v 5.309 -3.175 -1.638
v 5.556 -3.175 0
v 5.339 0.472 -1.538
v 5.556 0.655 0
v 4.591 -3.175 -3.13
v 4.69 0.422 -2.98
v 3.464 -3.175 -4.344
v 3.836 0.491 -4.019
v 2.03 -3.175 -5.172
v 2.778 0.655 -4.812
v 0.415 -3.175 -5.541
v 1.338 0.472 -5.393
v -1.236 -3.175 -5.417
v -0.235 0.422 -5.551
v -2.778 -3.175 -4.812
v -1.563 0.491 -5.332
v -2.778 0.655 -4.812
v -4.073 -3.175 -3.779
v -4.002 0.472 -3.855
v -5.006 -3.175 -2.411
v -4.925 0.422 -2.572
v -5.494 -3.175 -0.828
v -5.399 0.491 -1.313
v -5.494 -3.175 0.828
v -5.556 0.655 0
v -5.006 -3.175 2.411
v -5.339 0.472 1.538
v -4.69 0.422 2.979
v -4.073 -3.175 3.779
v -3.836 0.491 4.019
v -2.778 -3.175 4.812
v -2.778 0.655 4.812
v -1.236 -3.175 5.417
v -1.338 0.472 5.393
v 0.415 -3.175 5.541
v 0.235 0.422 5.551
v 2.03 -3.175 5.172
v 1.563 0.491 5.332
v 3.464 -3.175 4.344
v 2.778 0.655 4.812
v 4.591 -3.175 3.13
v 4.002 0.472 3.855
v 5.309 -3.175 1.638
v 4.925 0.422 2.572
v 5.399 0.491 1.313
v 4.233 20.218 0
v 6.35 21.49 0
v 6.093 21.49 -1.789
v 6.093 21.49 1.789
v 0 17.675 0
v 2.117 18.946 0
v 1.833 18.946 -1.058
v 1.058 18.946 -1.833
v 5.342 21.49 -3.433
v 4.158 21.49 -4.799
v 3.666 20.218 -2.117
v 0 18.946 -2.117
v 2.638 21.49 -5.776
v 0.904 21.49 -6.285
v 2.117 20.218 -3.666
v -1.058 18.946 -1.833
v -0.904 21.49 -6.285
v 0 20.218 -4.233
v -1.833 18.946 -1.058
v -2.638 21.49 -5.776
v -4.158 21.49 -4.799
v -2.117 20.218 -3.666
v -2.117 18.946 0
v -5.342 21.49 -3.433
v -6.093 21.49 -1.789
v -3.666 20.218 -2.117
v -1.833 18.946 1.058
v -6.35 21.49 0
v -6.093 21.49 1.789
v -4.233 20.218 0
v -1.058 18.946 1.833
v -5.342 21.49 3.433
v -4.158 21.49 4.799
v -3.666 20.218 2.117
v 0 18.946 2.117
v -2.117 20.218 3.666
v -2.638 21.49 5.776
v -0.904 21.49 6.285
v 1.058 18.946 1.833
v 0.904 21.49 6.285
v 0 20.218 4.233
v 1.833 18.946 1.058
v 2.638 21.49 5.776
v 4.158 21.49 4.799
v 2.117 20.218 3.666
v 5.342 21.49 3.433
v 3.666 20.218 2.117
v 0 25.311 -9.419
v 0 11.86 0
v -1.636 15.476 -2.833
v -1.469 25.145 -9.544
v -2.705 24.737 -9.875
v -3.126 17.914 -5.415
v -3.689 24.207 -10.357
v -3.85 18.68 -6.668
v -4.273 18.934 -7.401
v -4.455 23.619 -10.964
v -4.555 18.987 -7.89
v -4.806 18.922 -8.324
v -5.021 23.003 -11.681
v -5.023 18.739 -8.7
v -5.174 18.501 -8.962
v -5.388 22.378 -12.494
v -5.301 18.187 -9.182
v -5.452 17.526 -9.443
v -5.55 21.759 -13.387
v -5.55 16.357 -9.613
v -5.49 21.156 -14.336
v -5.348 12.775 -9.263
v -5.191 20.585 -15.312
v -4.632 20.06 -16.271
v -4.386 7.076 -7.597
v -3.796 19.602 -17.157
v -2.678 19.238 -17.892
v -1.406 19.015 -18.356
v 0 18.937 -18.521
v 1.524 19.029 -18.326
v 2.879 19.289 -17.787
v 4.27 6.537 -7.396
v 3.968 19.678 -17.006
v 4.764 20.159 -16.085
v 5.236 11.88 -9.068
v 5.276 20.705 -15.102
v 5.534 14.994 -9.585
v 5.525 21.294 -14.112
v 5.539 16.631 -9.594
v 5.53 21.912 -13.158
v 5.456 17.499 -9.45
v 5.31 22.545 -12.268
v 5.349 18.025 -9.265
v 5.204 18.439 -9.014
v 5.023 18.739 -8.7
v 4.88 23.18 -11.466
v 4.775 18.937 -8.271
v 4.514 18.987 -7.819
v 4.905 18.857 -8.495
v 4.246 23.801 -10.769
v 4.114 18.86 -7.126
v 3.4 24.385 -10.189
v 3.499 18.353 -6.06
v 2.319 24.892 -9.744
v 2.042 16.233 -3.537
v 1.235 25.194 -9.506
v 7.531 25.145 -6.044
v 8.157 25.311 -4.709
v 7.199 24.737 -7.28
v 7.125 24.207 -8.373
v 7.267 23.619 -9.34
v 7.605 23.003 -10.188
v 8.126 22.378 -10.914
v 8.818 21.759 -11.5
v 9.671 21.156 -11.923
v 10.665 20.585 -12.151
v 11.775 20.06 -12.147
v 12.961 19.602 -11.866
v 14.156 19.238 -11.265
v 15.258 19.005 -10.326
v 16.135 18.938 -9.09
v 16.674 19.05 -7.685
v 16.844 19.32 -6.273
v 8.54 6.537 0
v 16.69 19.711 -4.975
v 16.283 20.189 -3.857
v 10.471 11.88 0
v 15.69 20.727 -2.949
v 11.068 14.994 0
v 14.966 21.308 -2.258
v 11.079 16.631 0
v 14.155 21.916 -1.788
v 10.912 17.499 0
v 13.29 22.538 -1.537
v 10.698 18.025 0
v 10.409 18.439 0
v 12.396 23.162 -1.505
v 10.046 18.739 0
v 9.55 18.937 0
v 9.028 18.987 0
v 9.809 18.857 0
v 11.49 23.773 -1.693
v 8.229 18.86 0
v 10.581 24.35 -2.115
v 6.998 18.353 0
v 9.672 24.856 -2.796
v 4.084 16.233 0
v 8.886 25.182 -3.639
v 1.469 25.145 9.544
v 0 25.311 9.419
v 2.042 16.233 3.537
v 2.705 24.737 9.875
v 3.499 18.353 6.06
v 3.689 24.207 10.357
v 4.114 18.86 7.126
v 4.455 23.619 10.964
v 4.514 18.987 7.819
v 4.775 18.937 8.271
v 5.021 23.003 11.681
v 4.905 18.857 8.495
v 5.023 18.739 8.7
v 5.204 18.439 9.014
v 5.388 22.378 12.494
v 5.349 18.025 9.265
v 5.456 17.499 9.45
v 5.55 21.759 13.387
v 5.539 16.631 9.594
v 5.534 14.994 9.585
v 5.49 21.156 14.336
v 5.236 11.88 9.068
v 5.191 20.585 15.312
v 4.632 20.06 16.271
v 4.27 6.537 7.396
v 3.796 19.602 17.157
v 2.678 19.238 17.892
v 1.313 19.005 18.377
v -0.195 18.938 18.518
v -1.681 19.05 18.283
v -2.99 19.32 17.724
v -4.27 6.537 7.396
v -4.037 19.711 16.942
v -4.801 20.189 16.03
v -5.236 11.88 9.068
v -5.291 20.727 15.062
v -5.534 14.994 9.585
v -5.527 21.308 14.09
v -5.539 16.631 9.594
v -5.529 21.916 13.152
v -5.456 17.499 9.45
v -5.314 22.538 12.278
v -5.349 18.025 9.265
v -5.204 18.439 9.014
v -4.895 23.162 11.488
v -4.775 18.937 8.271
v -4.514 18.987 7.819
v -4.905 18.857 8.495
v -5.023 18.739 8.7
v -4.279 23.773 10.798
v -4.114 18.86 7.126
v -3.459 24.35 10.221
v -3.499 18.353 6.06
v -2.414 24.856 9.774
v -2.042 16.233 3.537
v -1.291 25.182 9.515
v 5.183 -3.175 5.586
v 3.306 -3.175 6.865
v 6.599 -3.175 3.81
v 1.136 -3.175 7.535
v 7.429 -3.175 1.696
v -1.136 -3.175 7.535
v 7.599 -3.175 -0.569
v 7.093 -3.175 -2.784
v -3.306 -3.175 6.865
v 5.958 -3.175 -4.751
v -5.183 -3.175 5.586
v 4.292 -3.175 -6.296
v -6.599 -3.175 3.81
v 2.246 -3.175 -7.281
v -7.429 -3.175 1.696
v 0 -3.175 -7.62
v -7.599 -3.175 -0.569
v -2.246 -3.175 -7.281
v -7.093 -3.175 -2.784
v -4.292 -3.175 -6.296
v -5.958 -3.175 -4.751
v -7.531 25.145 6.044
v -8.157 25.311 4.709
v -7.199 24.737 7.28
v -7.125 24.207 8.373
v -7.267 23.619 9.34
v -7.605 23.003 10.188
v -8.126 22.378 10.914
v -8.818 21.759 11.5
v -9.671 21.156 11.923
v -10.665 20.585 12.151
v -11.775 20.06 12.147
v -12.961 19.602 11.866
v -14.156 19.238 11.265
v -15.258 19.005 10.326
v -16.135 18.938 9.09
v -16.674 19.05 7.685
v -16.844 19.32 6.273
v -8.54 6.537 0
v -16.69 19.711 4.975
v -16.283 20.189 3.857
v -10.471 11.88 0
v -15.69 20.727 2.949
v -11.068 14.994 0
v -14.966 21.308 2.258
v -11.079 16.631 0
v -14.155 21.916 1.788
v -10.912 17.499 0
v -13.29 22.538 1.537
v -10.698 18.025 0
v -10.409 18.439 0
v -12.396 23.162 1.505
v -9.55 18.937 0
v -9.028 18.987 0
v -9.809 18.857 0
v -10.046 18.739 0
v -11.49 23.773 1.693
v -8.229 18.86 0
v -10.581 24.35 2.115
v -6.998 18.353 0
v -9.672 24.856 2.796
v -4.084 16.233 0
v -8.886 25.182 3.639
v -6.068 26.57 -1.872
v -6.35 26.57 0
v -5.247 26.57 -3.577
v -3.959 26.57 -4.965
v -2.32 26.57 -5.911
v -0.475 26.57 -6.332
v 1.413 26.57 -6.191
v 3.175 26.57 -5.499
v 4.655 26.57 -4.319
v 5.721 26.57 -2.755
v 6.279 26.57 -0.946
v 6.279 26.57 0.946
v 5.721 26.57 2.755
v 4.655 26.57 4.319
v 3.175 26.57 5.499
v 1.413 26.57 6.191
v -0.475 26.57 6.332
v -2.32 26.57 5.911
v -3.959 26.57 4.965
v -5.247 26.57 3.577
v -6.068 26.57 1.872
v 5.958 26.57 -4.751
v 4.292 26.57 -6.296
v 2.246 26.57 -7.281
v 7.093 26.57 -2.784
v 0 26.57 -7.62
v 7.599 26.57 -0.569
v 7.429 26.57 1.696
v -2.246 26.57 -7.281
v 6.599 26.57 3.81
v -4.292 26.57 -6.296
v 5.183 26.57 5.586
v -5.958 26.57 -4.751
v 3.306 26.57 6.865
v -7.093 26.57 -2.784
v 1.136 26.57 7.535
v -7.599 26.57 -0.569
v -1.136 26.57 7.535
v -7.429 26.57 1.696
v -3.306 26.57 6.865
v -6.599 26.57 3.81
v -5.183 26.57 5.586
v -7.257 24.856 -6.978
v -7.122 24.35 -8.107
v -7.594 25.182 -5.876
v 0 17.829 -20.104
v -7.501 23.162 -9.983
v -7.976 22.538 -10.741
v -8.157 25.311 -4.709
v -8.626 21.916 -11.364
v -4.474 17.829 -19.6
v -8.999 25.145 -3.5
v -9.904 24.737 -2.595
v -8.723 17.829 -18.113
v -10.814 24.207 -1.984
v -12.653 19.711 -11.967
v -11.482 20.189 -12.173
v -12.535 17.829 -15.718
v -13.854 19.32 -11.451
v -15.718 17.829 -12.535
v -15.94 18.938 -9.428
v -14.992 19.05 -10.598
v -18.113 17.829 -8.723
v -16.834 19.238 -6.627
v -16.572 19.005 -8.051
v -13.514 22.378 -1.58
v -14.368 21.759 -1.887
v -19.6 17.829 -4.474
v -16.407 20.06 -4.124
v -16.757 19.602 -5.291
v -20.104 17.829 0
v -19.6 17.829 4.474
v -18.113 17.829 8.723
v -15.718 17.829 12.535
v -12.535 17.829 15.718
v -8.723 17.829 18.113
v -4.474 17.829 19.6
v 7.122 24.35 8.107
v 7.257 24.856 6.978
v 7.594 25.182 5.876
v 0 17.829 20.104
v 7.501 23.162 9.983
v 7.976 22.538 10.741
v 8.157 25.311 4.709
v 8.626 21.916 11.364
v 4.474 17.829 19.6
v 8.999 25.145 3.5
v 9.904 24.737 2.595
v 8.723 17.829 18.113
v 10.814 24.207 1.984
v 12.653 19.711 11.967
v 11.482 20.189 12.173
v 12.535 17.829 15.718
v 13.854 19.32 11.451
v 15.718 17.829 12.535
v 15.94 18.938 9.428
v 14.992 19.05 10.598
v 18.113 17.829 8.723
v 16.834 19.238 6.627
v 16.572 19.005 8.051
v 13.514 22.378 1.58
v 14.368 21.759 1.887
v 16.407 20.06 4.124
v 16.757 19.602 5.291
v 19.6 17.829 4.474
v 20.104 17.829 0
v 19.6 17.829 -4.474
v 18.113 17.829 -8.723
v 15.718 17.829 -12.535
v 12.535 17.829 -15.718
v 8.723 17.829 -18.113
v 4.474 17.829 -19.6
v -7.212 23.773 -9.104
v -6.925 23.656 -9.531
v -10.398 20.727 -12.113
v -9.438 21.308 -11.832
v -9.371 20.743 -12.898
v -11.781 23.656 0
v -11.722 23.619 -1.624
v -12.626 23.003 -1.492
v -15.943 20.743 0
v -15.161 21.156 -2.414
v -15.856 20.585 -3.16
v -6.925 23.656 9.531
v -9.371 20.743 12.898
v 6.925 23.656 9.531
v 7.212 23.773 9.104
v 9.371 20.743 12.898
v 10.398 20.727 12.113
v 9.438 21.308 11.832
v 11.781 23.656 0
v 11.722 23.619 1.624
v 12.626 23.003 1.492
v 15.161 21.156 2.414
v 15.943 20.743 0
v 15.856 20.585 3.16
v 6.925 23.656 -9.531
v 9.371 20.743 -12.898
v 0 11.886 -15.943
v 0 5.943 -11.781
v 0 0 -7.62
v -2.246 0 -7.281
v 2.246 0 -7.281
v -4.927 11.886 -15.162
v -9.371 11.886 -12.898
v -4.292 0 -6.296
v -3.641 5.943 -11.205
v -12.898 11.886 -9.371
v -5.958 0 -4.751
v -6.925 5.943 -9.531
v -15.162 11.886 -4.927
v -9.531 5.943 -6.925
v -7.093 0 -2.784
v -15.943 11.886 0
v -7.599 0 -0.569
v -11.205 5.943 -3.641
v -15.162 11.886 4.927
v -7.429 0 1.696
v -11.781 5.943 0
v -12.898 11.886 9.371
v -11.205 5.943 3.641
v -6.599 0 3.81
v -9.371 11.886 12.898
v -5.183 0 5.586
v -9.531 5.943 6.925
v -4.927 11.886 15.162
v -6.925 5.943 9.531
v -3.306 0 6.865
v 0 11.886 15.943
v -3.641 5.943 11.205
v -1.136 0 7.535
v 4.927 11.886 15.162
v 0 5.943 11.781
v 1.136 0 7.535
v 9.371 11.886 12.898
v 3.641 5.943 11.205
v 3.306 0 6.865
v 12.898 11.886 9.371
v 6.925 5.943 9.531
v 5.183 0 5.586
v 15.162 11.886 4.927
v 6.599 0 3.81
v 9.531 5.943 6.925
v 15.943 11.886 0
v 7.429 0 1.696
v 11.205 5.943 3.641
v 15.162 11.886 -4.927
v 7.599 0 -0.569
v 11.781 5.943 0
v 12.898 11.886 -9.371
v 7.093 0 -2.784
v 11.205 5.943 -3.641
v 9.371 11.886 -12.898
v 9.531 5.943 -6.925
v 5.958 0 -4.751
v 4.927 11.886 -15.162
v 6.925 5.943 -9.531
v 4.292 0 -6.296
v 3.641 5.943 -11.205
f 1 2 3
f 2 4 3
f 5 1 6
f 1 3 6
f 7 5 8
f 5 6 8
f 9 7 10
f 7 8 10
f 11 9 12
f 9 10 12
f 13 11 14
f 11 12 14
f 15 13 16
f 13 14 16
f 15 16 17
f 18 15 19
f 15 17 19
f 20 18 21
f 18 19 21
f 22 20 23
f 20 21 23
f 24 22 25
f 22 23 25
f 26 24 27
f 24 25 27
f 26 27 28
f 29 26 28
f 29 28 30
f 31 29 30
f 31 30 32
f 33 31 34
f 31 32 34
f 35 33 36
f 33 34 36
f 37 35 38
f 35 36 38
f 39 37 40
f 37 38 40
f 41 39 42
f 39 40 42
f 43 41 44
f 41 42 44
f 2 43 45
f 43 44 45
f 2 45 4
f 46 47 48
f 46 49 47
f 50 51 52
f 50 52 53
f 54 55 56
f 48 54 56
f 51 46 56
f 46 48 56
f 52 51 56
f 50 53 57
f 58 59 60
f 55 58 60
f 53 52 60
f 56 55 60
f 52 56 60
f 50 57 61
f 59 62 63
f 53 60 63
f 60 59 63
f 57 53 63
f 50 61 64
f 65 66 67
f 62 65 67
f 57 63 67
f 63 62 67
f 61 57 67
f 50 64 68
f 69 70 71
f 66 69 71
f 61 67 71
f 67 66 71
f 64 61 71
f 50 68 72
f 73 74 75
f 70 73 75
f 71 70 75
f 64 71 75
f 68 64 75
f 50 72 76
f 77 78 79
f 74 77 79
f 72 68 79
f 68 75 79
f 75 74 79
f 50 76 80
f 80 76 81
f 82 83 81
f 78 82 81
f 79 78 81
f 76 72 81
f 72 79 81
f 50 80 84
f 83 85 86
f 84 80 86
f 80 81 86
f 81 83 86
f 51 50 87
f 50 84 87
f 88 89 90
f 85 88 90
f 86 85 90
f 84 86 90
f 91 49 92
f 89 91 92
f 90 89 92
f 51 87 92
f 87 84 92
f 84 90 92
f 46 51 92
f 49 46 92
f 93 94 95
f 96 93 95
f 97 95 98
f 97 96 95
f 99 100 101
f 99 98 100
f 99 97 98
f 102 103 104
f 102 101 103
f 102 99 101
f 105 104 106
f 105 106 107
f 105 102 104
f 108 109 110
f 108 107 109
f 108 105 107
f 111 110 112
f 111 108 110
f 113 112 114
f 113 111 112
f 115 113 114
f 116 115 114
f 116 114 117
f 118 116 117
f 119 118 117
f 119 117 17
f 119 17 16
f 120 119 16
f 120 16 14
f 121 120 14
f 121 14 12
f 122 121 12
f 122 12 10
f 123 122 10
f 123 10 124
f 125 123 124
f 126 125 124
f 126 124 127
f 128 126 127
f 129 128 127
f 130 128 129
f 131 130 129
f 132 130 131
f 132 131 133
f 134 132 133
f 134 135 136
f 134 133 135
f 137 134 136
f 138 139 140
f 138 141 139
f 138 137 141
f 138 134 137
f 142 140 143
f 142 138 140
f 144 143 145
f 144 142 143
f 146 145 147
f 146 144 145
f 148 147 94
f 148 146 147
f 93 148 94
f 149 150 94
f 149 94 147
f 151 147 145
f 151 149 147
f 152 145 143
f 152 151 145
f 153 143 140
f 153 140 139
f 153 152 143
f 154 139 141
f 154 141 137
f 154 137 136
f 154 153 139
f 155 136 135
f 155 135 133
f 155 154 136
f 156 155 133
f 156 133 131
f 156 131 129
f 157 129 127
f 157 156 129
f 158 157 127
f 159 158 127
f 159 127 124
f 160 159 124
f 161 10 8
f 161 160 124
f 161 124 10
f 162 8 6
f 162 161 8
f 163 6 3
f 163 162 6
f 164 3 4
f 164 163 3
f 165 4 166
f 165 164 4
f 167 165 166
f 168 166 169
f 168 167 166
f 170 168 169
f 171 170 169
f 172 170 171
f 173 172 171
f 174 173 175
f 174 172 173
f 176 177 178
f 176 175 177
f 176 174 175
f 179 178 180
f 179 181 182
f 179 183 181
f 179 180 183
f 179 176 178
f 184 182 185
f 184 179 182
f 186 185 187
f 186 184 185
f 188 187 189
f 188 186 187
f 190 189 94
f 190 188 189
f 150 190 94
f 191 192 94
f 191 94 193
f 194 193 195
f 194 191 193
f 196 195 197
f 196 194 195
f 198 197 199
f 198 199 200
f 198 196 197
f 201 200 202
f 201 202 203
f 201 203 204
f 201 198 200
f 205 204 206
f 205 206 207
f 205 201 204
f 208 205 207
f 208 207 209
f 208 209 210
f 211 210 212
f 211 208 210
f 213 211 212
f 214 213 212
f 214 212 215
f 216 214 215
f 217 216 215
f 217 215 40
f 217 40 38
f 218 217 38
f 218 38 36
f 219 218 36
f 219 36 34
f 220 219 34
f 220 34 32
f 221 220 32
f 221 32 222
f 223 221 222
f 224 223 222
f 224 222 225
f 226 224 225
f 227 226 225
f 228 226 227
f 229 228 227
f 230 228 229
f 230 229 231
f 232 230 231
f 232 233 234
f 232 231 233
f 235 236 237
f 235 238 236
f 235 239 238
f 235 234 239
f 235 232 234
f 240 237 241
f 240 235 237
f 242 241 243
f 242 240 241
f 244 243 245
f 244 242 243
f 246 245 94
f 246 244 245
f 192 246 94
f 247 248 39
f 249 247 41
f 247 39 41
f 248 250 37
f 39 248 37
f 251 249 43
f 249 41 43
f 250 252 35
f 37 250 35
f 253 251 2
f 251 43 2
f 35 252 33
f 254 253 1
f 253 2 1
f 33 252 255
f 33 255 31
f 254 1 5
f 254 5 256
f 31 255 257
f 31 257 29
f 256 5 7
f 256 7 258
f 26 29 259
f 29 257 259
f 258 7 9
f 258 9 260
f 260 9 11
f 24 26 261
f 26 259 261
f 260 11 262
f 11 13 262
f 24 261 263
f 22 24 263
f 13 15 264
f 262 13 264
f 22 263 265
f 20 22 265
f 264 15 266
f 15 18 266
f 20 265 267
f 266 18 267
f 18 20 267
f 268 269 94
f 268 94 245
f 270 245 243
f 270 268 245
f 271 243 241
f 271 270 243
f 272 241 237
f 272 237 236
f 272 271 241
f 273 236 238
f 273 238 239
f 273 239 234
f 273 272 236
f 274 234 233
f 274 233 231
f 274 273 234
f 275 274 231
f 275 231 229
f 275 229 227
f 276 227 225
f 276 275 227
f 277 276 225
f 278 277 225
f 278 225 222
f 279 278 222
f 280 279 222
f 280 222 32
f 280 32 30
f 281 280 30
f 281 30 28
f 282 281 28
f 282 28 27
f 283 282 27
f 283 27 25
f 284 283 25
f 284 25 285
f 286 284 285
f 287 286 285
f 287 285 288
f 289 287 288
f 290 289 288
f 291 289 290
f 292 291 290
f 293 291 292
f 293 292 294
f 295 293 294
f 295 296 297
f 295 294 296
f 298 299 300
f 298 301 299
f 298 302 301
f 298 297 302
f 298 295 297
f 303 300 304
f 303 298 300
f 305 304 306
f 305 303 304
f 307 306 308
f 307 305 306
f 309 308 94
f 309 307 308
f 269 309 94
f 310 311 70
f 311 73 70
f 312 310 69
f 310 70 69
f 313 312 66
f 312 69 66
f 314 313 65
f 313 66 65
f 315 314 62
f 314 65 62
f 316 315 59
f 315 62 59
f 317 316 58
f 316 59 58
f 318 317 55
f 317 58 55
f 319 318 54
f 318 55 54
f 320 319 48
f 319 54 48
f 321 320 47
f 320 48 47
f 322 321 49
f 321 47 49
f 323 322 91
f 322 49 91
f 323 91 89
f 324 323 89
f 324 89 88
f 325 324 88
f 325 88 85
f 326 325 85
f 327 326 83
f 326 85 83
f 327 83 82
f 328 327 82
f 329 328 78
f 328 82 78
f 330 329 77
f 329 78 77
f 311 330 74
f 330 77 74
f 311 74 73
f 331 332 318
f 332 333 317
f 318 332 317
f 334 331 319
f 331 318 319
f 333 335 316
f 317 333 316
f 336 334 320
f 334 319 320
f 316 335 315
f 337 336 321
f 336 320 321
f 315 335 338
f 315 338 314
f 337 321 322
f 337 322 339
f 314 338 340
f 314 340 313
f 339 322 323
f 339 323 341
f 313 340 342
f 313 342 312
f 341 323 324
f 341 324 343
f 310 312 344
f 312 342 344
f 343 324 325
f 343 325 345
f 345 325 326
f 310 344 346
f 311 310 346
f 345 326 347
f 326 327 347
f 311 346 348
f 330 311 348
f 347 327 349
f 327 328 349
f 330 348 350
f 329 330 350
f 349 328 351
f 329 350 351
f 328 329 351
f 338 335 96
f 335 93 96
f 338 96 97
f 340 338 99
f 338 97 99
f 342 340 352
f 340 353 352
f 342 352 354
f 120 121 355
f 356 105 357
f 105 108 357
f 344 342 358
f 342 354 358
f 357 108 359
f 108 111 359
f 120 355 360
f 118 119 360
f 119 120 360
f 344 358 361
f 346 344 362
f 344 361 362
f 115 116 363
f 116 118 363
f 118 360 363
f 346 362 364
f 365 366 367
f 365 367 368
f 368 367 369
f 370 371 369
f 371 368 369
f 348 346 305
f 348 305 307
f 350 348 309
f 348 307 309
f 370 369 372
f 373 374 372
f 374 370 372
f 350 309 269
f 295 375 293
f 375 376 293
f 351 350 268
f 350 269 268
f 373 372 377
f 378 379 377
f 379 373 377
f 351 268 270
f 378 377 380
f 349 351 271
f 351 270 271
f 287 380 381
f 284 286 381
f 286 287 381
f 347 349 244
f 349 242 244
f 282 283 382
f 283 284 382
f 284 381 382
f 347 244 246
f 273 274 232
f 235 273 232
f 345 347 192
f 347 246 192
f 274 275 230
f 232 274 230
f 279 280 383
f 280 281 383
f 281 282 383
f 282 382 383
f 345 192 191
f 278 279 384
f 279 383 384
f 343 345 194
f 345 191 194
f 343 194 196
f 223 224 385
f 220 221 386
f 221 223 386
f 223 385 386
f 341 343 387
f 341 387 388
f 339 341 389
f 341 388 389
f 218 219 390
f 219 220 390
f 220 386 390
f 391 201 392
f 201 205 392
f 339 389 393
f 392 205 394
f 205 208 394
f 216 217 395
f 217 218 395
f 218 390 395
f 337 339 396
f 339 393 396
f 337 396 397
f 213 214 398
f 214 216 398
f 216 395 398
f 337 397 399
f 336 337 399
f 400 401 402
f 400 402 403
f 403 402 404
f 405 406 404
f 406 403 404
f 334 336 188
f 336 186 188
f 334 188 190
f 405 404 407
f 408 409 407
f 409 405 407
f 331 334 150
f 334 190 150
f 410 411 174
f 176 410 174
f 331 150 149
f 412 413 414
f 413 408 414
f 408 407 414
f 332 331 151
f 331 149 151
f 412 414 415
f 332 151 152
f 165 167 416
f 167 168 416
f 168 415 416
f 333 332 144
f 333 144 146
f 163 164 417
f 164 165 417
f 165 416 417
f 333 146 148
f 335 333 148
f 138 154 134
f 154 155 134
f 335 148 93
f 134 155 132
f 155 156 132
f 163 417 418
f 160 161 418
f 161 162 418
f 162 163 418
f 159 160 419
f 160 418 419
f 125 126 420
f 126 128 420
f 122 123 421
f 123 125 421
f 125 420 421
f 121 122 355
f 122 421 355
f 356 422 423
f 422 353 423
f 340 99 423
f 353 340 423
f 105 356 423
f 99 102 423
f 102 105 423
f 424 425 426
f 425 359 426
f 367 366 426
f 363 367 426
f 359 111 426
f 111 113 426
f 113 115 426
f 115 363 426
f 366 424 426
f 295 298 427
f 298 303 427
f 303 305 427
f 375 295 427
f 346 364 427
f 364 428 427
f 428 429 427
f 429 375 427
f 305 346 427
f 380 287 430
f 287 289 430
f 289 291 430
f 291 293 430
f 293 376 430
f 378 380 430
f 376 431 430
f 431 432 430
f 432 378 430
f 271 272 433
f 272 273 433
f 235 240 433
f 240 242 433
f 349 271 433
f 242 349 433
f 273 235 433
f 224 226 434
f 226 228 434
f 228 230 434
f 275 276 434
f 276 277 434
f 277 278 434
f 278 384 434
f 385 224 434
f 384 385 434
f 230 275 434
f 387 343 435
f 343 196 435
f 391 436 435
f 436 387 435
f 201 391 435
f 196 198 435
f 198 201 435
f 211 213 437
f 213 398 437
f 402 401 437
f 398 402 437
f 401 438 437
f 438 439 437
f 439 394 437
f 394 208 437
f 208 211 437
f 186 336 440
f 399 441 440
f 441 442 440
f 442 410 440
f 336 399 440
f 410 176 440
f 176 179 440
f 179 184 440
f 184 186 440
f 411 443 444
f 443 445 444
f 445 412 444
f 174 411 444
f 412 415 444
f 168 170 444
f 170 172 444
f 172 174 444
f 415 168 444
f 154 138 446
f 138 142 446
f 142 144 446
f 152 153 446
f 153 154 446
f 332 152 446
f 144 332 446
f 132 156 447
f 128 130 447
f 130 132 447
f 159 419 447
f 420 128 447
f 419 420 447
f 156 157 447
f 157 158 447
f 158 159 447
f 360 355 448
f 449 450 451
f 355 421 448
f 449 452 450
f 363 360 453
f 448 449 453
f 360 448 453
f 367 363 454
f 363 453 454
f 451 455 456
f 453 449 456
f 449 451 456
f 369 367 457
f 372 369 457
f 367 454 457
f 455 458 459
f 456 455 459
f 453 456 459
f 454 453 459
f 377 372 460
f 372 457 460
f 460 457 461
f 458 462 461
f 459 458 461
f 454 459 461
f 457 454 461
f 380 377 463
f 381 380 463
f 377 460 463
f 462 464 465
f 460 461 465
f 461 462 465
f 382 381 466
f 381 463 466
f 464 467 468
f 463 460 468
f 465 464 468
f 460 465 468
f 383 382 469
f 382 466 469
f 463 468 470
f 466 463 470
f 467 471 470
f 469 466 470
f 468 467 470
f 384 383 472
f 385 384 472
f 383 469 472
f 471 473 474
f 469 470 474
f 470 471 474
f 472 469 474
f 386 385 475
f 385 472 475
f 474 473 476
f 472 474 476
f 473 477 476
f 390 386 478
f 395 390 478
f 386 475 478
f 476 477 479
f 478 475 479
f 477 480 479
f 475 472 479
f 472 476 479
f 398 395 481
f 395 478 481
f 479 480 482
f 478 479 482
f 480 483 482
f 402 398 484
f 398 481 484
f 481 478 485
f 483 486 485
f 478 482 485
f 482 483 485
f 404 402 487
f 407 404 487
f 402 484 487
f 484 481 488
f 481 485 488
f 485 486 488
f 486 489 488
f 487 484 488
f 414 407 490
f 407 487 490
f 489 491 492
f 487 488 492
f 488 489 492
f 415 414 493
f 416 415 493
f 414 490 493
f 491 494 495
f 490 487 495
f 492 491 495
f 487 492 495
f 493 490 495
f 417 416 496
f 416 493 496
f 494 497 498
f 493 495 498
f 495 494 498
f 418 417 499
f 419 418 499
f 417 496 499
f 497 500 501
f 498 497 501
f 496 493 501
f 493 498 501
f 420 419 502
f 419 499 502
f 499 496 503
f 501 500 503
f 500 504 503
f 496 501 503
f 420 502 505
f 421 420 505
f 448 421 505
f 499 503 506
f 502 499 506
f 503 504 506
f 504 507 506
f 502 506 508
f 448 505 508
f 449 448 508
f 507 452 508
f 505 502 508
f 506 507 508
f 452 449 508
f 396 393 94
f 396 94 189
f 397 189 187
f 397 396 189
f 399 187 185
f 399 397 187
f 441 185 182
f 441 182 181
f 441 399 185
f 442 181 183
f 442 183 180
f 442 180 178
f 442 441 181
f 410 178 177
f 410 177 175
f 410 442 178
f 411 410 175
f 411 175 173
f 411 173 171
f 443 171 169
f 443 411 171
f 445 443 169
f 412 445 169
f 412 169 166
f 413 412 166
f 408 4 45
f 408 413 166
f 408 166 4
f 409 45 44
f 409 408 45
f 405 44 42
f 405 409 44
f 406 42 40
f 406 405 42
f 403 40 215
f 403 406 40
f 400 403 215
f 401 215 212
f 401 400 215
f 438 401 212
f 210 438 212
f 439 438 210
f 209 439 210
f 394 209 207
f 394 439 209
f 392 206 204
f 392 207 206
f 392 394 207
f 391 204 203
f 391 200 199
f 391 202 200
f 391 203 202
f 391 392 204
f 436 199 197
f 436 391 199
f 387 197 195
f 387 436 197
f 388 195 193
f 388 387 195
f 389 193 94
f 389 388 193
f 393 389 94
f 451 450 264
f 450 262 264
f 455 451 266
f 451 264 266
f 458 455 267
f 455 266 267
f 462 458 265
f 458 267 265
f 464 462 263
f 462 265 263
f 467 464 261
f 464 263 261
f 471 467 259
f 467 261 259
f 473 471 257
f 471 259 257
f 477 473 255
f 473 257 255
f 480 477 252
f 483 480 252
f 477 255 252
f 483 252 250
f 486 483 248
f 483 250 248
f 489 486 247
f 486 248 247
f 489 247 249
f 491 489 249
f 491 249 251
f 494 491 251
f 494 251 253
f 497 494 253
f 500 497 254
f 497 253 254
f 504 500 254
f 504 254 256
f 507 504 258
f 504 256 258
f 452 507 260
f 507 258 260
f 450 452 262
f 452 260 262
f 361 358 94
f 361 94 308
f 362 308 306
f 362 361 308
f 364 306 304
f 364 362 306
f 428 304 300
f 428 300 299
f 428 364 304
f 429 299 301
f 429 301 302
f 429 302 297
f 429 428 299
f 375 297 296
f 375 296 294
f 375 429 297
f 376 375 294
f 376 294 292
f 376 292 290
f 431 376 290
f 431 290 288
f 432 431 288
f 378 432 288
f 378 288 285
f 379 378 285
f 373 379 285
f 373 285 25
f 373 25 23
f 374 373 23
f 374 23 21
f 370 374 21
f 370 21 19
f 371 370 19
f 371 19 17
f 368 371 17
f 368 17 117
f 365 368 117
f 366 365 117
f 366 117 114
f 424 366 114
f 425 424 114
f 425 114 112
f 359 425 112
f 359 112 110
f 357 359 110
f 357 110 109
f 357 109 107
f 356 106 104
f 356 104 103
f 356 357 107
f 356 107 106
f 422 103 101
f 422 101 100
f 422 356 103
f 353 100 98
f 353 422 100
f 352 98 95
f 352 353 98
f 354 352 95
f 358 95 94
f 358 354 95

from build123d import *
from OCP.BRepAlgoAPI import BRepAlgoAPI_Cut
from OCP.TopTools import TopTools_ListOfShape

# Parameters (mm, degrees)
F_7_16_0_4375_DIAMETER_HOLE4_D     = 11.1125
F_7_16_0_4375_DIAMETER_HOLE4_DEPTH = 6.35
F_7_16_0_4375_DIAMETER_HOLE4_TIP   = 3.338531814
CIRPATTERN3_COUNT                  = 6
F_1_2_0_5_DIAMETER_HOLE1_D         = 12.7
F_1_2_0_5_DIAMETER_HOLE1_DEPTH     = 5.08
F_1_2_0_5_DIAMETER_HOLE1_TIP       = 3.815464931


with BuildPart() as part:
    # Sketch1 → Revolve1 (revolve)
    with BuildSketch(Plane.XY):
        Polygon((0, 0), (0, 26.570129165), (7.62, 26.570129165), (20.103877155, 17.828824275), (7.62, 0), (7.62, -3.175), (0, -3.175), align=None)
    revolve(axis=Axis((0, 0, 0), (0, 1, 0)))

    # 7/16 (0.4375) Diameter Hole4
    with Locations(Plane(origin=(0.774073223, -3.175, 1.453774394), x_dir=(-1, 0, 0), z_dir=(0, -1, 0))):
        with Locations((0.774073223, 1.453774394)):
            Hole(F_7_16_0_4375_DIAMETER_HOLE4_D / 2, depth=F_7_16_0_4375_DIAMETER_HOLE4_DEPTH)
            with Locations((0, 0, -(F_7_16_0_4375_DIAMETER_HOLE4_DEPTH + F_7_16_0_4375_DIAMETER_HOLE4_TIP / 2))):  # 118° drill point
                Cone(0, F_7_16_0_4375_DIAMETER_HOLE4_D / 2, F_7_16_0_4375_DIAMETER_HOLE4_TIP, mode=Mode.SUBTRACT)


with BuildPart() as f_7_16_0_4375_diameter_hole5_tool:
    # Sketch14 → 7/16 (0.4375) Diameter Hole5 (revolve)
    with BuildSketch(Plane(origin=(0, 22.123811298, -13.97), x_dir=(0, 0.5735764363510476, 0.8191520442889908), z_dir=(1, 0, 0))):
        Polygon((0, 0), (0, 28.738531814), (5.55625, 25.4), (5.55625, 0), align=None)
    f_7_16_0_4375_diameter_hole5 = revolve(axis=Axis((0, 27.325426779, -17.612210371), (0, -0.8191520442889908, 0.5735764363510476)))


with BuildPart() as part_1:
    add(part.part)

    # 7/16 (0.4375) Diameter Hole5: cut by f_7_16_0_4375_diameter_hole5_tool, with a tolerance
    f_7_16_0_4375_diameter_hole5_stock = TopTools_ListOfShape()
    f_7_16_0_4375_diameter_hole5_stock.Append(part_1.part.wrapped)
    f_7_16_0_4375_diameter_hole5_tools = TopTools_ListOfShape()
    f_7_16_0_4375_diameter_hole5_tools.Append(f_7_16_0_4375_diameter_hole5_tool.part.wrapped)
    f_7_16_0_4375_diameter_hole5_cut = BRepAlgoAPI_Cut()
    f_7_16_0_4375_diameter_hole5_cut.SetArguments(f_7_16_0_4375_diameter_hole5_stock)
    f_7_16_0_4375_diameter_hole5_cut.SetTools(f_7_16_0_4375_diameter_hole5_tools)
    f_7_16_0_4375_diameter_hole5_cut.SetFuzzyValue(0.00001)
    f_7_16_0_4375_diameter_hole5_cut.Build()
    add(Compound.cast(f_7_16_0_4375_diameter_hole5_cut.Shape()).solids(), mode=Mode.REPLACE)

    # CirPattern3: 7/16 (0.4375) Diameter Hole5 ×6 about axis
    cirpattern3_axis = Axis((0, 26.570129165, 0), (0, -1, 0))
    for i in range(1, CIRPATTERN3_COUNT):
        add(f_7_16_0_4375_diameter_hole5.rotate(cirpattern3_axis, i * 360 / CIRPATTERN3_COUNT), mode=Mode.SUBTRACT)

    # 1/2 (0.5) Diameter Hole1
    with Locations(Plane(origin=(0, 26.570129165, 0), x_dir=(1, 0, 0), z_dir=(0, 1, 0))):
        with Locations((0, 0)):
            Hole(F_1_2_0_5_DIAMETER_HOLE1_D / 2, depth=F_1_2_0_5_DIAMETER_HOLE1_DEPTH)
            with Locations((0, 0, -(F_1_2_0_5_DIAMETER_HOLE1_DEPTH + F_1_2_0_5_DIAMETER_HOLE1_TIP / 2))):  # 118° drill point
                Cone(0, F_1_2_0_5_DIAMETER_HOLE1_D / 2, F_1_2_0_5_DIAMETER_HOLE1_TIP, mode=Mode.SUBTRACT)


solid = part_1.part
